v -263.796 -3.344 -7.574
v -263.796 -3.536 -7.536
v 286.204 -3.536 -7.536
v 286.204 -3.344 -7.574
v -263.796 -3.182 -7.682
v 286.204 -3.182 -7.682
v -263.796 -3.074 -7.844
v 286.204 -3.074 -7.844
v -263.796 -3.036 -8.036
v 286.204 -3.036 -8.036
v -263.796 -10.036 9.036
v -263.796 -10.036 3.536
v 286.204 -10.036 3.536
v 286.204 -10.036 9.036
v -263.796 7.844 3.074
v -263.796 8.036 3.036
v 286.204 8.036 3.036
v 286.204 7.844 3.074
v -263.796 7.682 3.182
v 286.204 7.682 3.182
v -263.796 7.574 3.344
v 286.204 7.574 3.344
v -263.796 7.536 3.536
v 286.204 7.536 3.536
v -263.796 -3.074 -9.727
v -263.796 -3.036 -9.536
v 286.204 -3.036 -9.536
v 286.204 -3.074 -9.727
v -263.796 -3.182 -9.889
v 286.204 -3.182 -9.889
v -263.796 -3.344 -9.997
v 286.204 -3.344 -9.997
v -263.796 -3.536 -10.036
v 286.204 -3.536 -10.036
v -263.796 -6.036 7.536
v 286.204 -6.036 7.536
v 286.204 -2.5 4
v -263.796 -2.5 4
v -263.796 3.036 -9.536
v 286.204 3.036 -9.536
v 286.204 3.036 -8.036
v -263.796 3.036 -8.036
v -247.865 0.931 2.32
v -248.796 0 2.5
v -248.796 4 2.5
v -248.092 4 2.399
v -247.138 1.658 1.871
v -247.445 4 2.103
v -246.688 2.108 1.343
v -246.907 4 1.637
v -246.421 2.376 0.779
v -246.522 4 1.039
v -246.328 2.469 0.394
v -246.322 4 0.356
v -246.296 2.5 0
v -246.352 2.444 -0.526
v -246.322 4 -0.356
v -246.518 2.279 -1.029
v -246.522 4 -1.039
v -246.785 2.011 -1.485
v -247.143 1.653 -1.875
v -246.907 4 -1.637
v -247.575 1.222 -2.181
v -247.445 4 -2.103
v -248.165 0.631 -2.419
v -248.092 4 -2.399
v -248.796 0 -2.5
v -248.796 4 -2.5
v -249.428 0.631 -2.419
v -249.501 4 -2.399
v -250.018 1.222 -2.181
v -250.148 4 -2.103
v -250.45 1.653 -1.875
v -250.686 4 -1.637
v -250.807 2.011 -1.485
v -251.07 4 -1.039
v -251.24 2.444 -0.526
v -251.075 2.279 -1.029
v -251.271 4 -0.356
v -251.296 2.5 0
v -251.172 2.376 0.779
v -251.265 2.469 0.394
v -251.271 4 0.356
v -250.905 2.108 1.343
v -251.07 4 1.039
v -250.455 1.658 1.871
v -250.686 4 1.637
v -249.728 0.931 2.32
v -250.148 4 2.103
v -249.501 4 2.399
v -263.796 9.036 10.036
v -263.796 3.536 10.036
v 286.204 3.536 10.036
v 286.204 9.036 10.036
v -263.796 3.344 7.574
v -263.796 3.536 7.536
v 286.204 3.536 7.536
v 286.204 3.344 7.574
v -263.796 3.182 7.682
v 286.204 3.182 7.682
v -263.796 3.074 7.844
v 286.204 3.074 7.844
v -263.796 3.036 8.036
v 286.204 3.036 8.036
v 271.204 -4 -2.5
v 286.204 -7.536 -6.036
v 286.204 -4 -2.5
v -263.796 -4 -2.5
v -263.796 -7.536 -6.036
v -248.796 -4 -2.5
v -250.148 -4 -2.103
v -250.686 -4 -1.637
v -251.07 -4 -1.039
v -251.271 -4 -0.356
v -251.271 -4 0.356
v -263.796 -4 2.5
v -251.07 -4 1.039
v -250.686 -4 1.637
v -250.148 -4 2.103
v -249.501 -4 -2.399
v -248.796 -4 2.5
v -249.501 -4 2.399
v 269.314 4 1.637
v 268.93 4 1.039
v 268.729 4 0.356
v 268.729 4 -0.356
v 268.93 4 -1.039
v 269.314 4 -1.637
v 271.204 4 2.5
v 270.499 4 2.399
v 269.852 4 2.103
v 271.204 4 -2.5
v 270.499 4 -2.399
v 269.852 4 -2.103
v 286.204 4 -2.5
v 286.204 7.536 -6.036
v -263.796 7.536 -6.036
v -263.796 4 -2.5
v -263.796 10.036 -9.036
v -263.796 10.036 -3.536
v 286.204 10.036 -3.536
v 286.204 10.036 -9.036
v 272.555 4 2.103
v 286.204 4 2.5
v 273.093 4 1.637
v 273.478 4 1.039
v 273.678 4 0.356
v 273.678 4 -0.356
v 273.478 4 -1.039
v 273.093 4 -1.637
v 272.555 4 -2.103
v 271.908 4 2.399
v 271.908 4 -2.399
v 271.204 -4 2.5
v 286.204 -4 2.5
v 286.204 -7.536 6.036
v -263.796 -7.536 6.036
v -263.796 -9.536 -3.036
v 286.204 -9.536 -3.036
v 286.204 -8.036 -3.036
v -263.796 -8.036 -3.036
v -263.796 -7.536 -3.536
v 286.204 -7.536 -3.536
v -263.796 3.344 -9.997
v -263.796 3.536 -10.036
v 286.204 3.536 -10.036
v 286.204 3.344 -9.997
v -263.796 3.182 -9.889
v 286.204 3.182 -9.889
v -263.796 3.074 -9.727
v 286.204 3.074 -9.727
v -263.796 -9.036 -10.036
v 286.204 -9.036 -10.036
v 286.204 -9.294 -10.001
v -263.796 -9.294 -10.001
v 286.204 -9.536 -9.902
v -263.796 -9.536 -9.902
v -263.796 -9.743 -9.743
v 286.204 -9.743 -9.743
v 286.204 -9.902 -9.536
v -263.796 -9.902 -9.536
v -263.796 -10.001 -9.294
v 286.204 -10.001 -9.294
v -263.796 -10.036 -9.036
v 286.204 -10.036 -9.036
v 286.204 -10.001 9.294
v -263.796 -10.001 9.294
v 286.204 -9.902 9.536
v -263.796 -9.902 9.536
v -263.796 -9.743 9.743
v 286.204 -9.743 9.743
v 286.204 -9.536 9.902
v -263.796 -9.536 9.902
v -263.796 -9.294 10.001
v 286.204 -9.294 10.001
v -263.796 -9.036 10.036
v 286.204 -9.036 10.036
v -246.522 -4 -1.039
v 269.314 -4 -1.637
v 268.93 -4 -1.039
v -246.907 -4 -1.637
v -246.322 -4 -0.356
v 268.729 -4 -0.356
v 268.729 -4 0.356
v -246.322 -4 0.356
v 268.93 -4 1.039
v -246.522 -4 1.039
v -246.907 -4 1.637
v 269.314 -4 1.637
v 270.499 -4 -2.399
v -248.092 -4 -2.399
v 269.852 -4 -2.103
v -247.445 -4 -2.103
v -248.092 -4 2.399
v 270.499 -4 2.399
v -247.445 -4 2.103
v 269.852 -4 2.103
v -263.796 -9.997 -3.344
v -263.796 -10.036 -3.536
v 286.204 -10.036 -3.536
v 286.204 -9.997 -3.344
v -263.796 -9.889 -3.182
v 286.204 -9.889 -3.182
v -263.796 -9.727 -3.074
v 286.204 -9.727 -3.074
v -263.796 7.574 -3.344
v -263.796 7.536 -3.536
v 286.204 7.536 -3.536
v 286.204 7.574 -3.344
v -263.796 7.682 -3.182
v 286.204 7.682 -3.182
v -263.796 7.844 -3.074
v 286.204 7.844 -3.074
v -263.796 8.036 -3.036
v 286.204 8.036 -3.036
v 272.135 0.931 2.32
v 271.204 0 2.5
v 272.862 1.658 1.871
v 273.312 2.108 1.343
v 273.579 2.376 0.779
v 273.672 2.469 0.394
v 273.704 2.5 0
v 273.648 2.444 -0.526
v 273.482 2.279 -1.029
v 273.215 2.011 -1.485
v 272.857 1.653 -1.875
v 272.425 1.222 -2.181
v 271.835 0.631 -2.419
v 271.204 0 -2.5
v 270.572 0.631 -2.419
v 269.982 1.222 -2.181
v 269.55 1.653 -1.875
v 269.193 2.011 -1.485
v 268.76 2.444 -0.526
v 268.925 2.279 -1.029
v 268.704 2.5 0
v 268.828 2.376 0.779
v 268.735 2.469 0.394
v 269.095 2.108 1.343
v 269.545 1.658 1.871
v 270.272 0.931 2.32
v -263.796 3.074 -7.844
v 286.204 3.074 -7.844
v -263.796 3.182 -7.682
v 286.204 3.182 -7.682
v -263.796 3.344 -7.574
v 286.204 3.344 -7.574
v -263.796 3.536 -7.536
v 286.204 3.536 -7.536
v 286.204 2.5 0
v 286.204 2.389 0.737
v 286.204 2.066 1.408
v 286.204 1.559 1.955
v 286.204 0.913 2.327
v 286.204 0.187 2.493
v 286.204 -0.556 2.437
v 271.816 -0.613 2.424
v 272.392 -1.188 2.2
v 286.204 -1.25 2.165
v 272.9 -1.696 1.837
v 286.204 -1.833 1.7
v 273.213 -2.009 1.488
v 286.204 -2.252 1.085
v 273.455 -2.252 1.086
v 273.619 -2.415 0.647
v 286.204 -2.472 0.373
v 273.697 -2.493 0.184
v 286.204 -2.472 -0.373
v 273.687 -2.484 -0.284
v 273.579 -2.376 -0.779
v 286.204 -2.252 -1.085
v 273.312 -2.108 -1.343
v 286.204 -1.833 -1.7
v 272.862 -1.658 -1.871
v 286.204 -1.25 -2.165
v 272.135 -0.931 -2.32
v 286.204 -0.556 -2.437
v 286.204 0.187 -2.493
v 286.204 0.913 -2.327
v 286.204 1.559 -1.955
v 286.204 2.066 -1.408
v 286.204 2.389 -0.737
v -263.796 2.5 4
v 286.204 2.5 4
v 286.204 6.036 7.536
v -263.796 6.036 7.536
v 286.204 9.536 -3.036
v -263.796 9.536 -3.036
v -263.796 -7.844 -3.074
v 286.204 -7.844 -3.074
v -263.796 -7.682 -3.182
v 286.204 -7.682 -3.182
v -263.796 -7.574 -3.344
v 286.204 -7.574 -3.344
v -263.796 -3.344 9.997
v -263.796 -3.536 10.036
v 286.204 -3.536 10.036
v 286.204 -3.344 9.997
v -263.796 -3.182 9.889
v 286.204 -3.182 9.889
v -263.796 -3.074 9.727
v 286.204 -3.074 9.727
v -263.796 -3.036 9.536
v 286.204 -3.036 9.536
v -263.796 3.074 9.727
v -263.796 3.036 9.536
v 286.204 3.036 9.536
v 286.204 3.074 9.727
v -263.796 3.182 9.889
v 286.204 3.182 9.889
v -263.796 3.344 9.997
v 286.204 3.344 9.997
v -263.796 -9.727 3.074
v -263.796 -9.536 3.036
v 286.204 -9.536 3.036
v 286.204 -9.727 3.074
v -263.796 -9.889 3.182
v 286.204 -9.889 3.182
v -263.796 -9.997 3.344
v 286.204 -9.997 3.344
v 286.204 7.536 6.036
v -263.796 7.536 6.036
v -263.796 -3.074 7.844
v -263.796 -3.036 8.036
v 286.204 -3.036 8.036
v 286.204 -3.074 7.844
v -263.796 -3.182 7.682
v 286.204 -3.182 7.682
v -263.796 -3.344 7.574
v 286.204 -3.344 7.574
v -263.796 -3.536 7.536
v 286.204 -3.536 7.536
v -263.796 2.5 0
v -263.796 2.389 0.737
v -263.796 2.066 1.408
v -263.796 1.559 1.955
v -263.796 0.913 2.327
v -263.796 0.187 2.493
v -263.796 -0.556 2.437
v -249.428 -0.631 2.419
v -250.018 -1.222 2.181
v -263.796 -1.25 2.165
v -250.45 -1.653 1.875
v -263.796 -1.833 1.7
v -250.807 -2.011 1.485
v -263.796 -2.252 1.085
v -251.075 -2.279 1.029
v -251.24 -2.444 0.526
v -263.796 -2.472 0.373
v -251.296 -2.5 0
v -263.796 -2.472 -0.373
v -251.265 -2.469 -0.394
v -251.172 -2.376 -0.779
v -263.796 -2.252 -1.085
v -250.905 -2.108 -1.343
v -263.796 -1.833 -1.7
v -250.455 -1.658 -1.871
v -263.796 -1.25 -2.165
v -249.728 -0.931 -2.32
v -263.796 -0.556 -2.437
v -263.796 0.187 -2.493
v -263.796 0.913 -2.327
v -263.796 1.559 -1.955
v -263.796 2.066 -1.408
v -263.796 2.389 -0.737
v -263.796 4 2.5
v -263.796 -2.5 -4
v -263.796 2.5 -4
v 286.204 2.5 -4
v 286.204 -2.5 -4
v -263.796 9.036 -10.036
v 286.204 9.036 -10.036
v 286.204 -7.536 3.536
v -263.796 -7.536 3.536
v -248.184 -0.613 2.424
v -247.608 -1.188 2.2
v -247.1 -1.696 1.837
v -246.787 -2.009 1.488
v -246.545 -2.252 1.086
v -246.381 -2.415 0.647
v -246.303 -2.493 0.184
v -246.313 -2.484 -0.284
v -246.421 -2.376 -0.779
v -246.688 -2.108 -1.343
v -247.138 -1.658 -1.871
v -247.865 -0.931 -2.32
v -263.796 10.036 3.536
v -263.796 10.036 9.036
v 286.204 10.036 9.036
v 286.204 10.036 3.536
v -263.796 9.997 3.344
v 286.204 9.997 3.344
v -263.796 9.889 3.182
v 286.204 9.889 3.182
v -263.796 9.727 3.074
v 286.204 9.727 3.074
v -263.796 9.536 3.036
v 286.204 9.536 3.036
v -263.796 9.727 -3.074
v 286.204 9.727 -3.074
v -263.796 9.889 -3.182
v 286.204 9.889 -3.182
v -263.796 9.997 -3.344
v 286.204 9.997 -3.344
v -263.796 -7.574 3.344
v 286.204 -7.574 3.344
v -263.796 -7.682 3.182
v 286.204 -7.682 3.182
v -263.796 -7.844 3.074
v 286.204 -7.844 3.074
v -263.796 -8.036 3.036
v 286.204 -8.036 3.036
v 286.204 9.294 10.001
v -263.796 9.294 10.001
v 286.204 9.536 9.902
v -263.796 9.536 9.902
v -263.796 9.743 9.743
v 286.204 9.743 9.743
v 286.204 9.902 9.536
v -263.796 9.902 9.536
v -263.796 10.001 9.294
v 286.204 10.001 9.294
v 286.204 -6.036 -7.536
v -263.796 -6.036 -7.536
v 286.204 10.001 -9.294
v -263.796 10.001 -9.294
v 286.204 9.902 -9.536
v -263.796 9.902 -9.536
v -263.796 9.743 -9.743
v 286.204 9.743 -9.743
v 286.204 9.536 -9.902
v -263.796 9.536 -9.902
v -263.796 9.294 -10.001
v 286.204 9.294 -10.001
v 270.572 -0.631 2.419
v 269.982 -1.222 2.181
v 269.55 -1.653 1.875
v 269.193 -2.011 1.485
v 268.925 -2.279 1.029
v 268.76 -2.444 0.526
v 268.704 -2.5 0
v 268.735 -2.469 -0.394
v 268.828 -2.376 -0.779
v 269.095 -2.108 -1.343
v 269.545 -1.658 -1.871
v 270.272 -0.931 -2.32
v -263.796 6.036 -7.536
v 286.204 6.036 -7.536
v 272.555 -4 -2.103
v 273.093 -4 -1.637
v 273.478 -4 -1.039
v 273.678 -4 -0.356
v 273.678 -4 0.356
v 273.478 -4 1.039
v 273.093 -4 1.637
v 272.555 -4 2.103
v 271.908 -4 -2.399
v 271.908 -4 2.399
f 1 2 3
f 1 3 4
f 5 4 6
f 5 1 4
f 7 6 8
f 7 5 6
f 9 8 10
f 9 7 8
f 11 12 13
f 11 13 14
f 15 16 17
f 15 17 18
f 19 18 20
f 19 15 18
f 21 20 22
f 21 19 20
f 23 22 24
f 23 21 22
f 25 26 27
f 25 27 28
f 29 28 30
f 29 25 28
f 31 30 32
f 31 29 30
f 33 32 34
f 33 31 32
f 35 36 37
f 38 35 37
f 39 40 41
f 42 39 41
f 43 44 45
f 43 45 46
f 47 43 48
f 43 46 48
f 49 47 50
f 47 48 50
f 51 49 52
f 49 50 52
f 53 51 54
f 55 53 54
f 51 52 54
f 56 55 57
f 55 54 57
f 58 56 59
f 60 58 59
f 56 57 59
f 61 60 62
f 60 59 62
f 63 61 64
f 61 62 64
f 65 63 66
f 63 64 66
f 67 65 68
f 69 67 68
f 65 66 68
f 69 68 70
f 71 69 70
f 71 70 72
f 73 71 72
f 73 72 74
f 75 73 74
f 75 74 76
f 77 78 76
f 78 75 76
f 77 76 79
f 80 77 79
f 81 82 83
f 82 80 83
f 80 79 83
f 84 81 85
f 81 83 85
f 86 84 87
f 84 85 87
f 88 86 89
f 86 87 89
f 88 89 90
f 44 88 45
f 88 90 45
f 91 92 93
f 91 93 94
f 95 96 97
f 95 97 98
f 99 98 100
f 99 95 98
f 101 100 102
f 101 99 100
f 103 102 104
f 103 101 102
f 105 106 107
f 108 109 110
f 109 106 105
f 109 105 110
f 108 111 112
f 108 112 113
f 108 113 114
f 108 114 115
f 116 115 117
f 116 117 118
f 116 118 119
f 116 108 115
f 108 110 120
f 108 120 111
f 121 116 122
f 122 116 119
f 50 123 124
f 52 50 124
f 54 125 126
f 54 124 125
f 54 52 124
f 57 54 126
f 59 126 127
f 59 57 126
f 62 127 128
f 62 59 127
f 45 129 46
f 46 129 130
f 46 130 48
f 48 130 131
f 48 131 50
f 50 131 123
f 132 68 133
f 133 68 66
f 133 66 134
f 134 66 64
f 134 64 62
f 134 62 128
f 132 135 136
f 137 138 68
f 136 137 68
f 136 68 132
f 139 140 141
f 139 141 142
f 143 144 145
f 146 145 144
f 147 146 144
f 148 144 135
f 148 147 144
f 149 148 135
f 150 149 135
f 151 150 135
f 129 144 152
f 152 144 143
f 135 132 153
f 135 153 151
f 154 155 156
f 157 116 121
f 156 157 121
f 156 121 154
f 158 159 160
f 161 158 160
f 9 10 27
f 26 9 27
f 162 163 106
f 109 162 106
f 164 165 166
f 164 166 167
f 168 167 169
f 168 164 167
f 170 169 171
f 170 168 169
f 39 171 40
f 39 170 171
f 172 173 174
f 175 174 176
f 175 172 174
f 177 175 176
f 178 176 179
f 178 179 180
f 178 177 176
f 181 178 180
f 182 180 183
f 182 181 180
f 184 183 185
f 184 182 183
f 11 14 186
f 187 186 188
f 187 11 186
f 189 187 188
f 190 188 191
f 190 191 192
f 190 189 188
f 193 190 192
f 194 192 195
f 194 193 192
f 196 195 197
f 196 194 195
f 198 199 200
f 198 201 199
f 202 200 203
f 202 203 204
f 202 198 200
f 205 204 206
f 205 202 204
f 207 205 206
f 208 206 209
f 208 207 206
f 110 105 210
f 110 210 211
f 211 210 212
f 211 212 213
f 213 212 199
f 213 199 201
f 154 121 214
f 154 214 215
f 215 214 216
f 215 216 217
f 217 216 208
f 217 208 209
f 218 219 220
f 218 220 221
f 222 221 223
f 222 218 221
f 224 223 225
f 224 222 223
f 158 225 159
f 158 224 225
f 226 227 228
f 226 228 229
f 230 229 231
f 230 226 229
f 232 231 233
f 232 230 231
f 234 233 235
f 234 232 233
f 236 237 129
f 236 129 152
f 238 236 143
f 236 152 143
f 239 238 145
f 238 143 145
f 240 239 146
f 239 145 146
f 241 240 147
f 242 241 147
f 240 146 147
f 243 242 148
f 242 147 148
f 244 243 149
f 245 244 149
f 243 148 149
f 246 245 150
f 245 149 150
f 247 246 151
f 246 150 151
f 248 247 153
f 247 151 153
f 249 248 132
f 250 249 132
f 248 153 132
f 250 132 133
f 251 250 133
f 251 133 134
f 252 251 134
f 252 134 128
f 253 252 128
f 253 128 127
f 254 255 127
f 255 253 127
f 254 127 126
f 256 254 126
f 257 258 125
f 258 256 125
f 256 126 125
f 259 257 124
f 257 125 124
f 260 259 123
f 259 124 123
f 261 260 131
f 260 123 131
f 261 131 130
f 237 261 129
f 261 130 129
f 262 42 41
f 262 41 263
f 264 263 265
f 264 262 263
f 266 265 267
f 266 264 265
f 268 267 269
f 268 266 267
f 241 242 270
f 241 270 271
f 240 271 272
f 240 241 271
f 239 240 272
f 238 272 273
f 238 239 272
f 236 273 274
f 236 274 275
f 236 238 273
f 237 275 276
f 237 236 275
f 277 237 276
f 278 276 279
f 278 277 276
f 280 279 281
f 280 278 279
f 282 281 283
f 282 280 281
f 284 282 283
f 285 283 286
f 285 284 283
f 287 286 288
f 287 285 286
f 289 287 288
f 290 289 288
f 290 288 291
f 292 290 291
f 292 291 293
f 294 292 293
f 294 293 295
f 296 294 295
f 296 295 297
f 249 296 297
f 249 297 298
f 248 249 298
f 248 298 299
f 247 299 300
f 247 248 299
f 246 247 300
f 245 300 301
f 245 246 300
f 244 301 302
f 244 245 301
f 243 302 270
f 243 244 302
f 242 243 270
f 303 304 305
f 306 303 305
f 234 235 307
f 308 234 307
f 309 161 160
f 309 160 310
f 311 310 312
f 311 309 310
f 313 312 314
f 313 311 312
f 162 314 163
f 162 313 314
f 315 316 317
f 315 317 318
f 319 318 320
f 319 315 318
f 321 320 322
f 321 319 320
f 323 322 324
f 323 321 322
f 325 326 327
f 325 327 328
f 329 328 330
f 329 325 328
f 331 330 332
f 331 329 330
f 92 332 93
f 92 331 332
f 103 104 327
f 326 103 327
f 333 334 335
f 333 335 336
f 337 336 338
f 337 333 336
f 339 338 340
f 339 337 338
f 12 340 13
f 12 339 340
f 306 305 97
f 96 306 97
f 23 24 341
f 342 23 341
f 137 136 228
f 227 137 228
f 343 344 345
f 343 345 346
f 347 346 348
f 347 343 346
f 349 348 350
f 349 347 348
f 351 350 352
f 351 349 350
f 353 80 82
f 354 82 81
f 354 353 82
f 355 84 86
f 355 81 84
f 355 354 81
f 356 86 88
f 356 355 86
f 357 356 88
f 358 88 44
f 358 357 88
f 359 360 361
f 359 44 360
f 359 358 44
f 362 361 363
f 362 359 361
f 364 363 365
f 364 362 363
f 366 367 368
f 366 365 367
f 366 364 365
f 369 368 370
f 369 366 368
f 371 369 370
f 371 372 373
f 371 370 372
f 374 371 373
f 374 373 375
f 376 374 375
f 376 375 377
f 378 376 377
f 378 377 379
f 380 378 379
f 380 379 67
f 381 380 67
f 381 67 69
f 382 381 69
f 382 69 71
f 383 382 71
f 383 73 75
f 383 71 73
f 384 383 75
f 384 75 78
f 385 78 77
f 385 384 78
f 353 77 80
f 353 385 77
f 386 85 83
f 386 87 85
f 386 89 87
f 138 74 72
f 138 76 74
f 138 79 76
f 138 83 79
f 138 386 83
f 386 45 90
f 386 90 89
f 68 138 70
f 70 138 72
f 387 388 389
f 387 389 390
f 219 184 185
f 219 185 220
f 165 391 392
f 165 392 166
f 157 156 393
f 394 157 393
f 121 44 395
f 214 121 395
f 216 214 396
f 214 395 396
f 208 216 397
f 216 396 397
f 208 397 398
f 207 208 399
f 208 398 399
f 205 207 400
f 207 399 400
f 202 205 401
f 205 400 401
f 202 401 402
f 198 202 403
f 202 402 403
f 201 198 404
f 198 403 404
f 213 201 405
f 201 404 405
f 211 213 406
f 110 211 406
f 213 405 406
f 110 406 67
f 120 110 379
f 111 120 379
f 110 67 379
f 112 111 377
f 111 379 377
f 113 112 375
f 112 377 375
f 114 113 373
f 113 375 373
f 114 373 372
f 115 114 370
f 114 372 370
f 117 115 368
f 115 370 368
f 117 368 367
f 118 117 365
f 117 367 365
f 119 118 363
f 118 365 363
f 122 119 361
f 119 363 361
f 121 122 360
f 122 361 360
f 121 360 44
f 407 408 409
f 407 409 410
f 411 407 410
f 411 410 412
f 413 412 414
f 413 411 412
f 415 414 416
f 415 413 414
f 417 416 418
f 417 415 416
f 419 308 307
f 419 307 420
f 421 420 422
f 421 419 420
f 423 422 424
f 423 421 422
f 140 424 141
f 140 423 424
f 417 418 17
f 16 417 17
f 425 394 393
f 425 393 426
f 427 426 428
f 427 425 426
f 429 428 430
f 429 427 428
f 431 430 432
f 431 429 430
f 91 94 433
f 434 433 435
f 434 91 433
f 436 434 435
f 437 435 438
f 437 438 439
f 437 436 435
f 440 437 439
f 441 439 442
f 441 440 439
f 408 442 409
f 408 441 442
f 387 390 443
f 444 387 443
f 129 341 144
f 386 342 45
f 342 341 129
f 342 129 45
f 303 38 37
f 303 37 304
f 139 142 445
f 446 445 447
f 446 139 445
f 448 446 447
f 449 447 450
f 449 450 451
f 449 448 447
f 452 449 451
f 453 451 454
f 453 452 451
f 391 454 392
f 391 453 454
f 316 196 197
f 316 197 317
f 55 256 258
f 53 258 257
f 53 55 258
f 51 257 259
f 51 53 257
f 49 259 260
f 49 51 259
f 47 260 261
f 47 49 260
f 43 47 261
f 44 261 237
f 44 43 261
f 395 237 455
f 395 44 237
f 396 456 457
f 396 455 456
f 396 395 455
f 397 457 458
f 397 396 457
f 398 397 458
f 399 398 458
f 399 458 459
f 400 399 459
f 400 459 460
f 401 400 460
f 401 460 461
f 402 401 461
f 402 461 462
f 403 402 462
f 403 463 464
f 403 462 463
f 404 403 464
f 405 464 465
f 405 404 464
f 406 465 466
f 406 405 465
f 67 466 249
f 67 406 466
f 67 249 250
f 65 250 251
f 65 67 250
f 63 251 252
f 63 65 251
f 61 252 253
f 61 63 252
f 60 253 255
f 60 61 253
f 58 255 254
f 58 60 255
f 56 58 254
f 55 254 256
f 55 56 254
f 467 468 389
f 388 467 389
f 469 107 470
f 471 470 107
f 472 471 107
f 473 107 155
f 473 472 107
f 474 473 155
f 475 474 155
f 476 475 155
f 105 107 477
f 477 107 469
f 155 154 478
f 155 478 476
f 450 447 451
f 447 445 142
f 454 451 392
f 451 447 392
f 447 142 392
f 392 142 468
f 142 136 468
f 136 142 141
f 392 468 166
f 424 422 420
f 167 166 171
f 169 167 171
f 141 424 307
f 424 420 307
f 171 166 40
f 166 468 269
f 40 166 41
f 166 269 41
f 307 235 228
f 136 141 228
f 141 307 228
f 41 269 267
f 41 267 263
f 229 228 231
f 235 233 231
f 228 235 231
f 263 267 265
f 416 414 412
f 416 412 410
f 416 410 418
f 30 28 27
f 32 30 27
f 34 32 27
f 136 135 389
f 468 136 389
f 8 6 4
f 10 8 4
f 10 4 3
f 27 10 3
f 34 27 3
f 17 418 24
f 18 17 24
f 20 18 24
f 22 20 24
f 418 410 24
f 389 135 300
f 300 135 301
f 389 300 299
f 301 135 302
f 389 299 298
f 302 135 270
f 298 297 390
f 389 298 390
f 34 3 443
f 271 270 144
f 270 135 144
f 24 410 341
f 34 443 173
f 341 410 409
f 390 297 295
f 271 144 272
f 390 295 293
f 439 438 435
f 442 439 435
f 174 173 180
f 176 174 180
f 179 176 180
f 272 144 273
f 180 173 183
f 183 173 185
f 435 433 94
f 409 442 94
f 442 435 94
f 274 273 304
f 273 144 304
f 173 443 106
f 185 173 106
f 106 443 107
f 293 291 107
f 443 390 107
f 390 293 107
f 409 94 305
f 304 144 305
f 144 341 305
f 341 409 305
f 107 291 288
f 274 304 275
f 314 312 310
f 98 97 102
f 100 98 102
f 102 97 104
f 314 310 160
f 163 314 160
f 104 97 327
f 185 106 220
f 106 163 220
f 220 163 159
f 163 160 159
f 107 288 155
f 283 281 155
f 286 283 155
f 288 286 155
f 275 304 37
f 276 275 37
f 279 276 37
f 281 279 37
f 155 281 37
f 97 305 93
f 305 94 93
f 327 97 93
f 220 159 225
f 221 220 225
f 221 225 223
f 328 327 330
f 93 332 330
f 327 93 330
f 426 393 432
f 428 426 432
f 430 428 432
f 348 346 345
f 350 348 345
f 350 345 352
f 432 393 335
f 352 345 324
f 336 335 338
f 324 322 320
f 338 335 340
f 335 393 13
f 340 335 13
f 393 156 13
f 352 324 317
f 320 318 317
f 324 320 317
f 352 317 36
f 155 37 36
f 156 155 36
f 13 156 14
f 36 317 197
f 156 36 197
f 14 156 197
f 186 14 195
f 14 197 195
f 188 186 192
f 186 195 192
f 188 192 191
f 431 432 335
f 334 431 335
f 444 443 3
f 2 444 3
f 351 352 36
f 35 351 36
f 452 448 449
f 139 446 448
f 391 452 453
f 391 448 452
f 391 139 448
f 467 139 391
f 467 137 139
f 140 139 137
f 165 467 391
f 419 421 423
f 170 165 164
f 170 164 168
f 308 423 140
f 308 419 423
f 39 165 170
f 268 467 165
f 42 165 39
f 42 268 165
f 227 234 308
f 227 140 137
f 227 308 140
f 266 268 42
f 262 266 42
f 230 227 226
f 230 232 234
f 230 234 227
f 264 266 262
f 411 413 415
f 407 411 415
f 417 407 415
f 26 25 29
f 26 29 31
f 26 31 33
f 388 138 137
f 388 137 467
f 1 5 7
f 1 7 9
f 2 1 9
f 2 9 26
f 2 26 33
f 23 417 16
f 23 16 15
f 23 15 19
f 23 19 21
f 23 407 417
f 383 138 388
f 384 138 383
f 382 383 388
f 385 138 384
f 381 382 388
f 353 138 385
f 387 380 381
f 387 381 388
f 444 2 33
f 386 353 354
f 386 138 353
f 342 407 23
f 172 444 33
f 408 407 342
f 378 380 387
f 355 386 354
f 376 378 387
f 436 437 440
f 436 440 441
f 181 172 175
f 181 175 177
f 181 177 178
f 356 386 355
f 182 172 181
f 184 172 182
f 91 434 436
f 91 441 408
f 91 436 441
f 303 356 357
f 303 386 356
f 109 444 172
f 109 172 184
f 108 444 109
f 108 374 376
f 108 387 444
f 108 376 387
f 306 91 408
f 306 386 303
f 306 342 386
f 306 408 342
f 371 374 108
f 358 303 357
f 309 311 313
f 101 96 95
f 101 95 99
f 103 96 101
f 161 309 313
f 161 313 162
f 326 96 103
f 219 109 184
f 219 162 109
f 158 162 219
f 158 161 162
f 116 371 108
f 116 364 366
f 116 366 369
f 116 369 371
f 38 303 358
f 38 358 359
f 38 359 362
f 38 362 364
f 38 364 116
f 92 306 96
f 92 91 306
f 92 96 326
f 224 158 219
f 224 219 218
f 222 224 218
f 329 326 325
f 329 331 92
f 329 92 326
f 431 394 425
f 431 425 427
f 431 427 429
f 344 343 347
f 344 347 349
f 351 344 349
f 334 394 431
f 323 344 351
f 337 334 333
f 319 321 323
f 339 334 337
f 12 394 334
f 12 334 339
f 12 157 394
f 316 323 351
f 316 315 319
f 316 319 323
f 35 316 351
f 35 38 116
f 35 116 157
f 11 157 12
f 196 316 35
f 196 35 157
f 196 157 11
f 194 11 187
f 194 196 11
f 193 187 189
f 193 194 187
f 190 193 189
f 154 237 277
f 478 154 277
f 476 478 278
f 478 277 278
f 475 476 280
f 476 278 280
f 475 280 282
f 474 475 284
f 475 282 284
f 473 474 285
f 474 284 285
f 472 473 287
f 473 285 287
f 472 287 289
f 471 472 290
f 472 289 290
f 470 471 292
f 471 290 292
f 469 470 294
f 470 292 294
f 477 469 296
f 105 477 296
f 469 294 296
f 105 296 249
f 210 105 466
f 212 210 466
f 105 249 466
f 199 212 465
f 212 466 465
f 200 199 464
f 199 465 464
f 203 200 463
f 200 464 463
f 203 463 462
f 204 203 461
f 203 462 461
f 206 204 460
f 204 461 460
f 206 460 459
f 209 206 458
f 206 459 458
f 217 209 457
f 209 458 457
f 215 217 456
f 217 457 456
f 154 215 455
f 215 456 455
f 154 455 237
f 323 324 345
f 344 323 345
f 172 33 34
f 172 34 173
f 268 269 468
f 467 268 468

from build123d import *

# Parameters (mm, degrees)
SKETCH11_R                            = 2.5
ALUMINIUM_PROF_ALUMINIUM_PROF_1_DEPTH = 550
SKETCH12_R                            = 2.5
CUT_EXTRUDE1_DEPTH                    = 287.723330349


with BuildPart() as part:
    # Sketch11 → Aluminium prof ALUMINIUM PROF(1) (new body)
    with BuildSketch(Plane.YZ.offset(-263.796296296)):
        with BuildLine():
            Line((-2.5, 4), (2.5, 4))
            Line((2.5, 4), (6.035533906, 7.535533906))
            Line((6.035533906, 7.535533906), (3.535533906, 7.535533906))
            ThreePointArc((3.535533906, 7.535533906), (3.181980515, 7.681980515), (3.035533906, 8.035533906))
            Line((3.035533906, 8.035533906), (3.035533906, 9.535533906))
            ThreePointArc((3.035533906, 9.535533906), (3.181980515, 9.889087297), (3.535533906, 10.035533906))
            Line((3.535533906, 10.035533906), (9.035533906, 10.035533906))
            ThreePointArc((9.035533906, 10.035533906), (9.742640687, 9.742640687), (10.035533906, 9.035533906))
            Line((10.035533906, 9.035533906), (10.035533906, 3.535533906))
            ThreePointArc((10.035533906, 3.535533906), (9.889087297, 3.181980515), (9.535533906, 3.035533906))
            Line((9.535533906, 3.035533906), (8.035533906, 3.035533906))
            ThreePointArc((8.035533906, 3.035533906), (7.681980515, 3.181980515), (7.535533906, 3.535533906))
            Line((7.535533906, 3.535533906), (7.535533906, 6.035533906))
            Line((7.535533906, 6.035533906), (4, 2.5))
            Line((4, 2.5), (4, -2.5))
            Line((4, -2.5), (7.535533906, -6.035533906))
            Line((7.535533906, -6.035533906), (7.535533906, -3.535533906))
            ThreePointArc((7.535533906, -3.535533906), (7.681980515, -3.181980515), (8.035533906, -3.035533906))
            Line((8.035533906, -3.035533906), (9.535533906, -3.035533906))
            ThreePointArc((9.535533906, -3.035533906), (9.889087297, -3.181980515), (10.035533906, -3.535533906))
            Line((10.035533906, -3.535533906), (10.035533906, -9.035533906))
            ThreePointArc((10.035533906, -9.035533906), (9.742640687, -9.742640687), (9.035533906, -10.035533906))
            Line((9.035533906, -10.035533906), (3.535533906, -10.035533906))
            ThreePointArc((3.535533906, -10.035533906), (3.181980515, -9.889087297), (3.035533906, -9.535533906))
            Line((3.035533906, -9.535533906), (3.035533906, -8.035533906))
            ThreePointArc((3.035533906, -8.035533906), (3.181980515, -7.681980515), (3.535533906, -7.535533906))
            Line((3.535533906, -7.535533906), (6.035533906, -7.535533906))
            Line((6.035533906, -7.535533906), (2.5, -4))
            Line((2.5, -4), (-2.5, -4))
            Line((-2.5, -4), (-6.035533906, -7.535533906))
            Line((-6.035533906, -7.535533906), (-3.535533906, -7.535533906))
            ThreePointArc((-3.535533906, -7.535533906), (-3.181980515, -7.681980515), (-3.035533906, -8.035533906))
            Line((-3.035533906, -8.035533906), (-3.035533906, -9.535533906))
            ThreePointArc((-3.035533906, -9.535533906), (-3.181980515, -9.889087297), (-3.535533906, -10.035533906))
            Line((-3.535533906, -10.035533906), (-9.035533906, -10.035533906))
            ThreePointArc((-9.035533906, -10.035533906), (-9.742640687, -9.742640687), (-10.035533906, -9.035533906))
            Line((-10.035533906, -9.035533906), (-10.035533906, -3.535533906))
            ThreePointArc((-10.035533906, -3.535533906), (-9.889087297, -3.181980515), (-9.535533906, -3.035533906))
            Line((-9.535533906, -3.035533906), (-8.035533906, -3.035533906))
            ThreePointArc((-8.035533906, -3.035533906), (-7.681980515, -3.181980515), (-7.535533906, -3.535533906))
            Line((-7.535533906, -3.535533906), (-7.535533906, -6.035533906))
            Line((-7.535533906, -6.035533906), (-4, -2.5))
            Line((-4, -2.5), (-4, 2.5))
            Line((-4, 2.5), (-7.535533906, 6.035533906))
            Line((-7.535533906, 6.035533906), (-7.535533906, 3.535533906))
            ThreePointArc((-7.535533906, 3.535533906), (-7.681980515, 3.181980515), (-8.035533906, 3.035533906))
            Line((-8.035533906, 3.035533906), (-9.535533906, 3.035533906))
            ThreePointArc((-9.535533906, 3.035533906), (-9.889087297, 3.181980515), (-10.035533906, 3.535533906))
            Line((-10.035533906, 3.535533906), (-10.035533906, 9.035533906))
            ThreePointArc((-10.035533906, 9.035533906), (-9.742640687, 9.742640687), (-9.035533906, 10.035533906))
            Line((-9.035533906, 10.035533906), (-3.535533906, 10.035533906))
            ThreePointArc((-3.535533906, 10.035533906), (-3.181980515, 9.889087297), (-3.035533906, 9.535533906))
            Line((-3.035533906, 9.535533906), (-3.035533906, 8.035533906))
            ThreePointArc((-3.035533906, 8.035533906), (-3.181980515, 7.681980515), (-3.535533906, 7.535533906))
            Line((-3.535533906, 7.535533906), (-6.035533906, 7.535533906))
            Line((-6.035533906, 7.535533906), (-2.5, 4))
        make_face()
        Circle(SKETCH11_R, mode=Mode.SUBTRACT)
    extrude(amount=ALUMINIUM_PROF_ALUMINIUM_PROF_1_DEPTH)

    # Sketch12 → Cut-Extrude1 (cut, through all)
    with BuildSketch(Plane(origin=(0, 4, 0), x_dir=(1, 0, 0), z_dir=(0, 1, 0))):
        with Locations(Location((-248.796296296, 0, 0), (0, 0, 270))):
            Circle(SKETCH12_R)
        with Locations(Location((271.203703704, 0, 0), (0, 0, 270))):
            Circle(SKETCH12_R)
    extrude(amount=-CUT_EXTRUDE1_DEPTH, mode=Mode.SUBTRACT)


solid = part.part
